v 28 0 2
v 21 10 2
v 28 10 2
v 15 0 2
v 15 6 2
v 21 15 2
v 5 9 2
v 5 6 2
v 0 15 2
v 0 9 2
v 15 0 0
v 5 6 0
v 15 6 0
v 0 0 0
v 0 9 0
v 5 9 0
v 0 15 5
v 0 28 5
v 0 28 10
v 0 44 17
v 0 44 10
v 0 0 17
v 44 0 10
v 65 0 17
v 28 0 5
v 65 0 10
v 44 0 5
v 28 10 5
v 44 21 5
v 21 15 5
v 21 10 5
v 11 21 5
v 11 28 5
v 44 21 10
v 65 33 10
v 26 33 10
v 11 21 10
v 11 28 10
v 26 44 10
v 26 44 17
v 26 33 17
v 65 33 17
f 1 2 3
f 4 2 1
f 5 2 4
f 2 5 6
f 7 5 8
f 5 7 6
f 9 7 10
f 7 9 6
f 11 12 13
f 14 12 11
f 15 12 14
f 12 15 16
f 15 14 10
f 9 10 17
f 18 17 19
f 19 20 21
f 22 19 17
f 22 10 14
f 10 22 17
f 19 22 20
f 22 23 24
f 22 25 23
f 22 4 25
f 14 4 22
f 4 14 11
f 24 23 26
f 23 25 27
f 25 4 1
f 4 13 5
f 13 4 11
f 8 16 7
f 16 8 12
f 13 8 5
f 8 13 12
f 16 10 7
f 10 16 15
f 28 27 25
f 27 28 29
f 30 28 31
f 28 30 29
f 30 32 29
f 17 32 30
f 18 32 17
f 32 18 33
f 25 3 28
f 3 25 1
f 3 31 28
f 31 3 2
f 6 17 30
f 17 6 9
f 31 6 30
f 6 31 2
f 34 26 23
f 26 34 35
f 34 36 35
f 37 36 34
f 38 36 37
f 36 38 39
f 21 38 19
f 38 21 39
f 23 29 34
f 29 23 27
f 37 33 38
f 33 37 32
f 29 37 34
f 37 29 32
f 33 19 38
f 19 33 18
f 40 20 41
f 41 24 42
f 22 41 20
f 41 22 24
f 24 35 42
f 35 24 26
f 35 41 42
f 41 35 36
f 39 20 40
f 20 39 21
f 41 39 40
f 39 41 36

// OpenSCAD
translate([2.5, 1.5, 1.0]) color([0.11873023670071103, 0.7834936358921726, 0.09890076646638046]) cube([5, 3, 2], center=true);
translate([7.5, 1.5, 1.0]) color([0.7328850061793606, 0.2487736956630997, 0.28455698400578255]) cube([5, 3, 2], center=true);
translate([12.5, 1.5, 1.0]) color([0.7360834330107994, 0.6596207917216363, 0.7419215555155583]) cube([5, 3, 2], center=true);
translate([2.5, 4.5, 1.0]) color([0.5152830587943614, 0.8590958196652707, 0.12179389137547159]) cube([5, 3, 2], center=true);
translate([7.5, 4.5, 1.0]) color([0.6451969614065052, 0.11824431248865597, 0.7372833681454282]) cube([5, 3, 2], center=true);
translate([12.5, 4.5, 1.0]) color([0.3589046614584527, 0.67488210437111, 0.7034839134412817]) cube([5, 3, 2], center=true);
translate([2.5, 7.5, 1.0]) color([0.6606084576410584, 0.22155798032782648, 0.8317998863873537]) cube([5, 3, 2], center=true);
translate([3.5, 2.5, 3.5]) color([0.24013608742346748, 0.5181532972121122, 0.6746457541533513]) cube([7, 5, 3], center=true);
translate([10.5, 2.5, 3.5]) color([0.23360317478475656, 0.628511722983939, 0.2868310479973286]) cube([7, 5, 3], center=true);
translate([17.5, 2.5, 3.5]) color([0.1713823760843869, 0.809748828526577, 0.5531227700773604]) cube([7, 5, 3], center=true);
translate([24.5, 2.5, 3.5]) color([0.32788470660885605, 0.5854309472055399, 0.025286397427288332]) cube([7, 5, 3], center=true);
translate([3.5, 7.5, 3.5]) color([0.12982285676032723, 0.3955808516982431, 0.9757565794644123]) cube([7, 5, 3], center=true);
translate([10.5, 7.5, 3.5]) color([0.5104745178761232, 0.07645620506689521, 0.7650406152494567]) cube([7, 5, 3], center=true);
translate([17.5, 7.5, 3.5]) color([0.7814438709253152, 0.7748021743948562, 0.5694980380479538]) cube([7, 5, 3], center=true);
translate([24.5, 7.5, 3.5]) color([0.6956987378694627, 0.21345793631163135, 0.7325605908939883]) cube([7, 5, 3], center=true);
translate([3.5, 12.5, 3.5]) color([0.8161739873415944, 0.7599665402219192, 0.353462402585887]) cube([7, 5, 3], center=true);
translate([10.5, 12.5, 3.5]) color([0.5910280505757086, 0.6289893574898388, 0.9008098536570839]) cube([7, 5, 3], center=true);
translate([17.5, 12.5, 3.5]) color([0.1080138952733335, 0.8339337708504084, 0.5264355584690392]) cube([7, 5, 3], center=true);
translate([5.5, 3.5, 7.5]) color([0.3586141205519373, 0.4556029014937524, 0.012635498930738787]) cube([11, 7, 5], center=true);
translate([16.5, 3.5, 7.5]) color([0.22007359233142765, 0.6527634200680049, 0.660849279754449]) cube([11, 7, 5], center=true);
translate([27.5, 3.5, 7.5]) color([0.4946989402863131, 0.9533258805973196, 0.4809150885494712]) cube([11, 7, 5], center=true);
translate([38.5, 3.5, 7.5]) color([0.3139436595456605, 0.8477808391956414, 0.259158299397262]) cube([11, 7, 5], center=true);
translate([5.5, 10.5, 7.5]) color([0.6043059930343495, 0.7034188523223, 0.8216962986917842]) cube([11, 7, 5], center=true);
translate([16.5, 10.5, 7.5]) color([0.7853687501827489, 0.3840923305137113, 0.059180305962736934]) cube([11, 7, 5], center=true);
translate([27.5, 10.5, 7.5]) color([0.03828786548344276, 0.7264603879084595, 0.9616913814068508]) cube([11, 7, 5], center=true);
translate([38.5, 10.5, 7.5]) color([0.3431653742712939, 0.44119509807551416, 0.7257980157417766]) cube([11, 7, 5], center=true);
translate([5.5, 17.5, 7.5]) color([0.6578312458538799, 0.26010658848413604, 0.6715848457987025]) cube([11, 7, 5], center=true);
translate([16.5, 17.5, 7.5]) color([0.3049024195743838, 0.3563579065620385, 0.5395133052630944]) cube([11, 7, 5], center=true);
translate([27.5, 17.5, 7.5]) color([0.7323138239267305, 0.15121621156796483, 0.021987210892938758]) cube([11, 7, 5], center=true);
translate([38.5, 17.5, 7.5]) color([0.6278299544850219, 0.024564677785836264, 0.04496324071616853]) cube([11, 7, 5], center=true);
translate([5.5, 24.5, 7.5]) color([0.22577557672213355, 0.6538768733044555, 0.06654509768602879]) cube([11, 7, 5], center=true);
translate([6.5, 5.5, 13.5]) color([0.06240576762652772, 0.9720932443736168, 0.4226528937805498]) cube([13, 11, 7], center=true);
translate([19.5, 5.5, 13.5]) color([0.8924289339928592, 0.21652428395276402, 0.4352131794546169]) cube([13, 11, 7], center=true);
translate([32.5, 5.5, 13.5]) color([0.35803513461315506, 0.17693553603496914, 0.32881318575191665]) cube([13, 11, 7], center=true);
translate([45.5, 5.5, 13.5]) color([0.9867958186960467, 0.7473090097951195, 0.3826682791831585]) cube([13, 11, 7], center=true);
translate([58.5, 5.5, 13.5]) color([0.40928443439993156, 0.2637409011550663, 0.531336678598825]) cube([13, 11, 7], center=true);
translate([6.5, 16.5, 13.5]) color([0.7356369121419466, 0.686646615750601, 0.46264983534131954]) cube([13, 11, 7], center=true);
translate([19.5, 16.5, 13.5]) color([0.041939046716157, 0.9215078064992686, 0.4089338030960661]) cube([13, 11, 7], center=true);
translate([32.5, 16.5, 13.5]) color([0.3902988670119316, 0.0031101144891549914, 0.13822721408191307]) cube([13, 11, 7], center=true);
translate([45.5, 16.5, 13.5]) color([0.8688534175006787, 0.513934596181303, 0.7324348442226767]) cube([13, 11, 7], center=true);
translate([58.5, 16.5, 13.5]) color([0.14816788643335854, 0.33005100665524945, 0.8401365565378639]) cube([13, 11, 7], center=true);
translate([6.5, 27.5, 13.5]) color([0.8206585211774247, 0.2467942680862406, 0.021975308333072263]) cube([13, 11, 7], center=true);
translate([19.5, 27.5, 13.5]) color([0.8064669735456029, 0.16884400503942165, 0.7876813921208954]) cube([13, 11, 7], center=true);
translate([32.5, 27.5, 13.5]) color([0.6836592298851071, 0.1683147603108942, 0.0784886436699127]) cube([13, 11, 7], center=true);
translate([45.5, 27.5, 13.5]) color([0.9276494299222889, 0.5978783972833935, 0.620510173056511]) cube([13, 11, 7], center=true);
translate([58.5, 27.5, 13.5]) color([0.4575118028380537, 0.15007097732228858, 0.6019699129465877]) cube([13, 11, 7], center=true);
translate([6.5, 38.5, 13.5]) color([0.2524728800375037, 0.8058946560175415, 0.732718954805416]) cube([13, 11, 7], center=true);
translate([19.5, 38.5, 13.5]) color([0.027267185045511733, 0.9324230096450348, 0.03631604832667812]) cube([13, 11, 7], center=true);
